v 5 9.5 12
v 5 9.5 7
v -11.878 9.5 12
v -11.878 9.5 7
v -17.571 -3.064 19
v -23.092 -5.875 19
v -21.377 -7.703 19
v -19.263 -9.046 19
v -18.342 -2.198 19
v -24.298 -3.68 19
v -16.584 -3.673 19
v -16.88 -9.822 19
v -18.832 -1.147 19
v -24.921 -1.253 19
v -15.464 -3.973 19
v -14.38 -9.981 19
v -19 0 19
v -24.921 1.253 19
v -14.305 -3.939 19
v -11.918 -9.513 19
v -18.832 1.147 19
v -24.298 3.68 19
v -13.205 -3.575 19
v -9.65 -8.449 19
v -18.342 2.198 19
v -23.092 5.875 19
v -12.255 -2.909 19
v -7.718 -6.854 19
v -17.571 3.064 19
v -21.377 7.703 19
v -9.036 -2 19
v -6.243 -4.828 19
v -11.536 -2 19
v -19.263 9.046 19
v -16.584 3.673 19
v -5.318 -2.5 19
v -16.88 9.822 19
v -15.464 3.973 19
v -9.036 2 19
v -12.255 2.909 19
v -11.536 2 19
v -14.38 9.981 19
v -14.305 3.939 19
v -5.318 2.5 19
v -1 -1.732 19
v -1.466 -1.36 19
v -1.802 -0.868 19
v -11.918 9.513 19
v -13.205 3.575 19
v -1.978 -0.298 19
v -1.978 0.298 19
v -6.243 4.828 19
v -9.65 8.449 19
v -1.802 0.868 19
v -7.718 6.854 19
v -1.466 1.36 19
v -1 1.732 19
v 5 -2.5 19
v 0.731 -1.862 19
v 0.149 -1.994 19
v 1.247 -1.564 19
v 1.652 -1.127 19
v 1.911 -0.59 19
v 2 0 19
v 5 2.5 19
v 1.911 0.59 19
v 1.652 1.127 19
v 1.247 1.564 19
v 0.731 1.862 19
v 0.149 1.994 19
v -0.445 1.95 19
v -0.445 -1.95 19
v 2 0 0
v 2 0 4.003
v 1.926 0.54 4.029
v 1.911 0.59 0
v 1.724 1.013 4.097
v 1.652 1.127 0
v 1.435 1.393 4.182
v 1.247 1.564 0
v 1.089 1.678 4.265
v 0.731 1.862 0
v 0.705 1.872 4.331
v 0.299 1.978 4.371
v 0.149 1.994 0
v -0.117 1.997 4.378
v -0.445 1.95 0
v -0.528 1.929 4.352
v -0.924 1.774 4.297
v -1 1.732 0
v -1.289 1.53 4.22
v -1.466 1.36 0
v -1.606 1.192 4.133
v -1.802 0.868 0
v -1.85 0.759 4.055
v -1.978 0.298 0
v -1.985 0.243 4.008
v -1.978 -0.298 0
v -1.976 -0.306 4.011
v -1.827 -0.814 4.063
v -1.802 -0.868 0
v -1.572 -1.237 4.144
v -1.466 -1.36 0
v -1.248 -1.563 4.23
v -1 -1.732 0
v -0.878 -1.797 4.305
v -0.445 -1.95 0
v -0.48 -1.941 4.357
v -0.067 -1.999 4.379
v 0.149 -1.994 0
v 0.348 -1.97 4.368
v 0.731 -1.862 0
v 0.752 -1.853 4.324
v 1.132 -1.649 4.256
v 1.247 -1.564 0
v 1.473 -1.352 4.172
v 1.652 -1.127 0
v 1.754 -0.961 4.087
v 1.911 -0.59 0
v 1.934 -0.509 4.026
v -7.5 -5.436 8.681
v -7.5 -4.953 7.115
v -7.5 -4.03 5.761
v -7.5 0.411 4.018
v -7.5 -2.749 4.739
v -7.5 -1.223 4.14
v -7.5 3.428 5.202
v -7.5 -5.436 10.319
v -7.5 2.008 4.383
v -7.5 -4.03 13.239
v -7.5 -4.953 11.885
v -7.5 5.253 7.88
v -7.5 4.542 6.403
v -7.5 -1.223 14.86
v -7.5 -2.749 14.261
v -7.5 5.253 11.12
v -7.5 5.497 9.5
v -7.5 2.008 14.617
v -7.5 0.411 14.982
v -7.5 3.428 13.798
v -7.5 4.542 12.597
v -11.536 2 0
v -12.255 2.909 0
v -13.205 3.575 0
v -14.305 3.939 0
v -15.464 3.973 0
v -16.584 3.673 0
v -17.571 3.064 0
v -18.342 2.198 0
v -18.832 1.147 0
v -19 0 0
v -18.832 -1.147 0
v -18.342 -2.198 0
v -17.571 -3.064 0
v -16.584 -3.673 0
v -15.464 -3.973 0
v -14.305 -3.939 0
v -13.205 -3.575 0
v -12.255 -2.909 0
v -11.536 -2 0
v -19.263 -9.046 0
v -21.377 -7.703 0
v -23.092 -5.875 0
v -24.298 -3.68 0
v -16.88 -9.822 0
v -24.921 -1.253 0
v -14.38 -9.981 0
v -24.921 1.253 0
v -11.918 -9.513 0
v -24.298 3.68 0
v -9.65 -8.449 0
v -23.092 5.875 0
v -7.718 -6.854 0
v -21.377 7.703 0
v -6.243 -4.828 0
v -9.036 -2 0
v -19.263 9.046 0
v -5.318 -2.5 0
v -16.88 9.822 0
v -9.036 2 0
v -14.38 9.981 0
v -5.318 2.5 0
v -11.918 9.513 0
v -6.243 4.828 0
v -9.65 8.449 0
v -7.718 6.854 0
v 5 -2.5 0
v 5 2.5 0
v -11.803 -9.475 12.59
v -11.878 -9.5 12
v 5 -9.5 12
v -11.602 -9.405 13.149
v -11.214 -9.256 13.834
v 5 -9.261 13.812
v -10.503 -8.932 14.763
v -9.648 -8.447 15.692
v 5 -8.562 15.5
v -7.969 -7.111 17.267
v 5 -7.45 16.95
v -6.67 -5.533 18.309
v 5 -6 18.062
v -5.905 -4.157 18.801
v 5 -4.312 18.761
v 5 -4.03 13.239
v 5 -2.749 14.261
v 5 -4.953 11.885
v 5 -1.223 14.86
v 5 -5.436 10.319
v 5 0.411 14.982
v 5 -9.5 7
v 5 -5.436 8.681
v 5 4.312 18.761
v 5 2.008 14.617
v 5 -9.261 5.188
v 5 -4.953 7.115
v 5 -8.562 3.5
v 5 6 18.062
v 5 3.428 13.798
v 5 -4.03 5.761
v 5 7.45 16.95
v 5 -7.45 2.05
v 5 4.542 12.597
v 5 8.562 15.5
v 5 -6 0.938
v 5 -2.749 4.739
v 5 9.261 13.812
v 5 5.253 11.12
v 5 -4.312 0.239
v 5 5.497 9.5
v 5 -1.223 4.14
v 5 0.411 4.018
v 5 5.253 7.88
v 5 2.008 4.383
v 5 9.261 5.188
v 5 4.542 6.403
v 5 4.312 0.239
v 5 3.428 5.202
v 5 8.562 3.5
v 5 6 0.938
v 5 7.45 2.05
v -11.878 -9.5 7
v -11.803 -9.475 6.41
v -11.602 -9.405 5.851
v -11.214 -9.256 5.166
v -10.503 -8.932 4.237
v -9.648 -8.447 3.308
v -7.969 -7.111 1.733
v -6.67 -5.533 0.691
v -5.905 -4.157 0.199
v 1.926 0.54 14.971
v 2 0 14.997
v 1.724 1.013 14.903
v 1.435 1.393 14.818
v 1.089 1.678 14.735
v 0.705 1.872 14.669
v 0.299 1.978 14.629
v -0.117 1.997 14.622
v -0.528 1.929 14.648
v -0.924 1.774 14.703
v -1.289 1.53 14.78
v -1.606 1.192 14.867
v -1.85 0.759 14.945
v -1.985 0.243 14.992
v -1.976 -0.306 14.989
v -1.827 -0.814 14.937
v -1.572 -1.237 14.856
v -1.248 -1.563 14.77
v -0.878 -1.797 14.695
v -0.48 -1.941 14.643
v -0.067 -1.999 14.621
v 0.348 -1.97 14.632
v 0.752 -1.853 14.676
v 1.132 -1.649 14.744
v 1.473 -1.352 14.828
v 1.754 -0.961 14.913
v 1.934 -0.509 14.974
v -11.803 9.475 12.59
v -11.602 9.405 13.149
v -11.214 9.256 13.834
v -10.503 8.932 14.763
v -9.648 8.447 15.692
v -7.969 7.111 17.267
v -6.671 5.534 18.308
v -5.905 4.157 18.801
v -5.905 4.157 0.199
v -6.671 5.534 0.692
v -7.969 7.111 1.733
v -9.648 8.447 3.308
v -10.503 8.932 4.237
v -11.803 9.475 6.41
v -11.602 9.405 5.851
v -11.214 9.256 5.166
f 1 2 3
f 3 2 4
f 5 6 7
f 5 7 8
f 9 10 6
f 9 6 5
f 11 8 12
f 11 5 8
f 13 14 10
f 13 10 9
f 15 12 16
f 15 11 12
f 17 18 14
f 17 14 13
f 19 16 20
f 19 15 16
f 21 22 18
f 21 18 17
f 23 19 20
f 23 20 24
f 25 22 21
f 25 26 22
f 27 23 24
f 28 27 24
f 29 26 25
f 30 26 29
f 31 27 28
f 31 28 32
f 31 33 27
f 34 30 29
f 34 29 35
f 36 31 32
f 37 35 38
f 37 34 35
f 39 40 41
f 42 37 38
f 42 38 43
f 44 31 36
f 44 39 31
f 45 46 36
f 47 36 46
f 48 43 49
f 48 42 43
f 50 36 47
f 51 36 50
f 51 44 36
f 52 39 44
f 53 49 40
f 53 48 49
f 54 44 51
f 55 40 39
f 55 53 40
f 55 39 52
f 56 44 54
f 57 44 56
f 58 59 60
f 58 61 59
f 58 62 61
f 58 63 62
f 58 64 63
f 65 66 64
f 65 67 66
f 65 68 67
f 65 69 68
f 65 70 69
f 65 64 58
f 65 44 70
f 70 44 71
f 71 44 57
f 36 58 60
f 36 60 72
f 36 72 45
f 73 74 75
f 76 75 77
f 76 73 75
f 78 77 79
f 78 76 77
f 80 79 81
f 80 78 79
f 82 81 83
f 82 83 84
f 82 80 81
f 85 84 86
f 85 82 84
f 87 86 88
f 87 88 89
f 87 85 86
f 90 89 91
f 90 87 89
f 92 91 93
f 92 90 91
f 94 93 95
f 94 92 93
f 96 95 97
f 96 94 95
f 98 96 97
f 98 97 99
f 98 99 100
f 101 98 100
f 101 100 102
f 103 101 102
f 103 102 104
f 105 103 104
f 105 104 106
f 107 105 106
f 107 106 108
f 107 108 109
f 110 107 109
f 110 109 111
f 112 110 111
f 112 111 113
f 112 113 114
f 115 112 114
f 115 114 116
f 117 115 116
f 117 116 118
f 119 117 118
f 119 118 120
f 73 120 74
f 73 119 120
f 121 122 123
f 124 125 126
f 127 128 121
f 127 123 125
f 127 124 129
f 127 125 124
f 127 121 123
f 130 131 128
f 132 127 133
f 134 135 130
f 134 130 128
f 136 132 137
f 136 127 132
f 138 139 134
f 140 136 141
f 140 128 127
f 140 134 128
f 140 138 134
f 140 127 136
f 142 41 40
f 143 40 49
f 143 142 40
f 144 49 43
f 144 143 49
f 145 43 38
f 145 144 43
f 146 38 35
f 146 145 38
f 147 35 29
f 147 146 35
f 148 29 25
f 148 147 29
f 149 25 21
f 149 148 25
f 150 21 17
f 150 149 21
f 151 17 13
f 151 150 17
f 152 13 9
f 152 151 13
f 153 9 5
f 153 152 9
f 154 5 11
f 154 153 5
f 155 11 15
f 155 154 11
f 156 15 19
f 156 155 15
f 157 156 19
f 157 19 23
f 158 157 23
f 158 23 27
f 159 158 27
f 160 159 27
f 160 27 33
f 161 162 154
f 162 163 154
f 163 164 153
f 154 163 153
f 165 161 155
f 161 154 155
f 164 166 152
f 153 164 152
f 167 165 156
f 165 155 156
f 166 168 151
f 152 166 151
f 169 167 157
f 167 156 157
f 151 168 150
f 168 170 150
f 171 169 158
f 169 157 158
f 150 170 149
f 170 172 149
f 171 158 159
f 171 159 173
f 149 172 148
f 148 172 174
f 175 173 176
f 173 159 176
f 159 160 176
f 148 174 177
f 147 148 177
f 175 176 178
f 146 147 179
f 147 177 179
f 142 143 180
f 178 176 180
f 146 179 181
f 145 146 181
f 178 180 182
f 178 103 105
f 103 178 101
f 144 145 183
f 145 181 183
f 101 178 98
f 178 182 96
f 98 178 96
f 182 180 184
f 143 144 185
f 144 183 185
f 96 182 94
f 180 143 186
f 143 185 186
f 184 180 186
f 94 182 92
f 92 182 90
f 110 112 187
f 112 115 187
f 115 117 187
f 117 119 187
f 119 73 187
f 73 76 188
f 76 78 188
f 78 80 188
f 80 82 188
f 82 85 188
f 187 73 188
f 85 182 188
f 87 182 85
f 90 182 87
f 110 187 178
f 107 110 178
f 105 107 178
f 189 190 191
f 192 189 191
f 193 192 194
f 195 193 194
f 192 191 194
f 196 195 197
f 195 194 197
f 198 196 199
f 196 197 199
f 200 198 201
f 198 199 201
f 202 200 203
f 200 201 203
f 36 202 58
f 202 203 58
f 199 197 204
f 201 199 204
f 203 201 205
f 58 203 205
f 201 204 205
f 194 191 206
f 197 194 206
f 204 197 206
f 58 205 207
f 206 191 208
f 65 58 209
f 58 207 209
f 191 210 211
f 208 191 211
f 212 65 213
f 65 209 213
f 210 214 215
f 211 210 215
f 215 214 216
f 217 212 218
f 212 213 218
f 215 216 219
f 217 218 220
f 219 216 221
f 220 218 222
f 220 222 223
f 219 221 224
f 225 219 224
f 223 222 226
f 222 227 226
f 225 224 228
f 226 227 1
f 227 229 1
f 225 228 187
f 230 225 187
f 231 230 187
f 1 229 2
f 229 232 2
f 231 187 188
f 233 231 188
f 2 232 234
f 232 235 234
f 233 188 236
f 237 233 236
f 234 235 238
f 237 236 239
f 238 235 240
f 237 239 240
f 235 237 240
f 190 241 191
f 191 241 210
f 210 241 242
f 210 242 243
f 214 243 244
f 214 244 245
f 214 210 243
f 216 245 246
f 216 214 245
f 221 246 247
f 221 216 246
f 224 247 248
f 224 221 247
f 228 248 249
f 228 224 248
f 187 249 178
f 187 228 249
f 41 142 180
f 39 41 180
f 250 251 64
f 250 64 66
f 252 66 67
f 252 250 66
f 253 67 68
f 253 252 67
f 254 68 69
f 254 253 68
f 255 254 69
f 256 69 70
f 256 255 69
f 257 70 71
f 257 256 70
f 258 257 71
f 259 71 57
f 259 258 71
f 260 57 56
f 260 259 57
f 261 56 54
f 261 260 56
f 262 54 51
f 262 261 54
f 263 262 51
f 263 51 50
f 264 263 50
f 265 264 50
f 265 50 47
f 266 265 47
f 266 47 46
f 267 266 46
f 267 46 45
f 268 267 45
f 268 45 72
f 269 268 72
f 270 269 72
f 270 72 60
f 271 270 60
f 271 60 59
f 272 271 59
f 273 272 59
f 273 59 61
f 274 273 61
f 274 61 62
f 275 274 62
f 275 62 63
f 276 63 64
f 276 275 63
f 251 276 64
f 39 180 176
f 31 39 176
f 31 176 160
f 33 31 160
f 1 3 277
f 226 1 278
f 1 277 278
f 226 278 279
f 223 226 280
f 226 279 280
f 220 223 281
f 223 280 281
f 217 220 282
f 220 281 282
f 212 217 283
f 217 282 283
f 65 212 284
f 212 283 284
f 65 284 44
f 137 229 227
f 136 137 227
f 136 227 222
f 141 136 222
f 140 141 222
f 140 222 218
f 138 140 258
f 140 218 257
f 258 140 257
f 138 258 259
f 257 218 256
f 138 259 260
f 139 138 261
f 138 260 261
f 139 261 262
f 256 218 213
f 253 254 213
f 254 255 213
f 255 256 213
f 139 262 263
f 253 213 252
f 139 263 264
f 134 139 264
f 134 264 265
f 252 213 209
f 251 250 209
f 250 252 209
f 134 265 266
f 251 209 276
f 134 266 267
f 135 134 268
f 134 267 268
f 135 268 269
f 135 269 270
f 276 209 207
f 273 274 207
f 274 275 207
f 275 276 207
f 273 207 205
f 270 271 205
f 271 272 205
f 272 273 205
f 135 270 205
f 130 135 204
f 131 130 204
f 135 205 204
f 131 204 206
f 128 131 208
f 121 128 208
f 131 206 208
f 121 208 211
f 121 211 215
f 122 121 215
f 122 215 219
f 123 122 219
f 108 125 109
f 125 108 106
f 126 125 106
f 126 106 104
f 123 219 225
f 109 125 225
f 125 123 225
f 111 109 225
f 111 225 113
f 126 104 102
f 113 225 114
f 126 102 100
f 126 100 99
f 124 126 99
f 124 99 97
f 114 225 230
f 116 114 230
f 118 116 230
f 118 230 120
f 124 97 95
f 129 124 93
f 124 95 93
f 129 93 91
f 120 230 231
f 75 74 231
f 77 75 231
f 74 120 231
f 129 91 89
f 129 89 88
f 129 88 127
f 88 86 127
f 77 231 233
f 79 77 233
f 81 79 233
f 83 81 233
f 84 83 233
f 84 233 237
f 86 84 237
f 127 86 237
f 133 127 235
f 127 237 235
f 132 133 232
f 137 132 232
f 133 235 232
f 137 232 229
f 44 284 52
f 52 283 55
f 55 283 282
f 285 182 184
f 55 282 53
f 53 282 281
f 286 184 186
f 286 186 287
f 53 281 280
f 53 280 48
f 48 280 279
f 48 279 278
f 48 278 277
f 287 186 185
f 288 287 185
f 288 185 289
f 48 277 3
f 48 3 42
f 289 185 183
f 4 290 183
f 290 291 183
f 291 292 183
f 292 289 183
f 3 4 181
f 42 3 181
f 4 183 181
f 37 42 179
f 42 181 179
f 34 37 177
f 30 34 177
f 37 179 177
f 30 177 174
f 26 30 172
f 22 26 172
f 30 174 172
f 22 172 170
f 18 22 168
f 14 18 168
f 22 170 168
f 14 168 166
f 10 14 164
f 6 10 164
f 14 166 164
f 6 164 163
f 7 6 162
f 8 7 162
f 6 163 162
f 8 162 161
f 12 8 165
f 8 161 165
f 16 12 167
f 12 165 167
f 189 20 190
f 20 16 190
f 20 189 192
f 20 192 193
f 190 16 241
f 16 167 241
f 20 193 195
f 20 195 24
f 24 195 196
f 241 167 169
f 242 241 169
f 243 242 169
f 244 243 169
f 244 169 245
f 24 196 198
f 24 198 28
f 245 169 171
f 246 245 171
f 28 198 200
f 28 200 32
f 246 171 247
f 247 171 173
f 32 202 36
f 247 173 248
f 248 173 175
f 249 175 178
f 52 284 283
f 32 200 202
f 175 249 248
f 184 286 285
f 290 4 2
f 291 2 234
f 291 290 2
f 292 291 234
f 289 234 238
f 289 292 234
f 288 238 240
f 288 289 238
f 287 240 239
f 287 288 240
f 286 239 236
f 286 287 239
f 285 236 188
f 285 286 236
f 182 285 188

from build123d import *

# Parameters (mm, degrees)
ESBO_O1_R                = 4
ESBO_O1_R_2              = 2
RESSALTO_EXTRUS_O1_DEPTH = 19
FILETE1_R                = 7
ESBO_O3_R                = 5.497341607
CORTE_EXTRUS_O1_DEPTH    = 12.5
CORTE_EXTRUS_O5_DEPTH    = 33.95451427


with BuildPart() as part:
    # Esboço1 → Ressalto-extrusão1 (new body)
    with BuildSketch(Plane.XY):
        with BuildLine():
            Line((5, -9.5), (5, 0))
            Line((5, 0), (5, 9.5))
            Line((5, 9.5), (-11.877501001, 9.5))
            ThreePointArc((-11.877501001, 9.5), (-25, 0), (-11.877501001, -9.5))
            Line((-11.877501001, -9.5), (5, -9.5))
        make_face()
        with Locations((-15, 0)):
            Circle(ESBO_O1_R, mode=Mode.SUBTRACT)
        Circle(ESBO_O1_R_2, mode=Mode.SUBTRACT)
    extrude(amount=RESSALTO_EXTRUS_O1_DEPTH)

    # Filete1
    filete1_edges = [part.edges().sort_by_distance(p)[0] for p in [
        (-3.4387505, 9.5, 0),
        (-3.4387505, 9.5, 19),
        (-3.4387505, -9.5, 19),
        (-3.4387505, -9.5, 0),
    ]]
    fillet(filete1_edges, radius=FILETE1_R)

    # Esboço3 → Corte-extrusão1 (cut)
    with BuildSketch(Plane(origin=(5, 0, 0), x_dir=(0, 0, -1), z_dir=(1, 0, 0))):
        with Locations(Location((-9.5, 0, 0), (0, 0, 90))):
            Circle(ESBO_O3_R)
    extrude(amount=-CORTE_EXTRUS_O1_DEPTH, mode=Mode.SUBTRACT)

    # Esboço5 → Corte-extrusão5 (cut, through all)
    with BuildSketch(Plane(origin=(0, 0, 0), x_dir=(-1, 0, 0), z_dir=(0, 0, -1))):
        with BuildLine():
            Line((9.035898385, 0), (9.035898385, -2))
            Line((9.035898385, -2), (11.535898385, -2))
            ThreePointArc((11.535898385, -2), (11, 0), (11.535898385, 2))
            Line((11.535898385, 2), (9.035898385, 2))
            Line((9.035898385, 2), (9.035898385, 0))
        make_face()
    extrude(amount=-CORTE_EXTRUS_O5_DEPTH, mode=Mode.SUBTRACT)


solid = part.part
